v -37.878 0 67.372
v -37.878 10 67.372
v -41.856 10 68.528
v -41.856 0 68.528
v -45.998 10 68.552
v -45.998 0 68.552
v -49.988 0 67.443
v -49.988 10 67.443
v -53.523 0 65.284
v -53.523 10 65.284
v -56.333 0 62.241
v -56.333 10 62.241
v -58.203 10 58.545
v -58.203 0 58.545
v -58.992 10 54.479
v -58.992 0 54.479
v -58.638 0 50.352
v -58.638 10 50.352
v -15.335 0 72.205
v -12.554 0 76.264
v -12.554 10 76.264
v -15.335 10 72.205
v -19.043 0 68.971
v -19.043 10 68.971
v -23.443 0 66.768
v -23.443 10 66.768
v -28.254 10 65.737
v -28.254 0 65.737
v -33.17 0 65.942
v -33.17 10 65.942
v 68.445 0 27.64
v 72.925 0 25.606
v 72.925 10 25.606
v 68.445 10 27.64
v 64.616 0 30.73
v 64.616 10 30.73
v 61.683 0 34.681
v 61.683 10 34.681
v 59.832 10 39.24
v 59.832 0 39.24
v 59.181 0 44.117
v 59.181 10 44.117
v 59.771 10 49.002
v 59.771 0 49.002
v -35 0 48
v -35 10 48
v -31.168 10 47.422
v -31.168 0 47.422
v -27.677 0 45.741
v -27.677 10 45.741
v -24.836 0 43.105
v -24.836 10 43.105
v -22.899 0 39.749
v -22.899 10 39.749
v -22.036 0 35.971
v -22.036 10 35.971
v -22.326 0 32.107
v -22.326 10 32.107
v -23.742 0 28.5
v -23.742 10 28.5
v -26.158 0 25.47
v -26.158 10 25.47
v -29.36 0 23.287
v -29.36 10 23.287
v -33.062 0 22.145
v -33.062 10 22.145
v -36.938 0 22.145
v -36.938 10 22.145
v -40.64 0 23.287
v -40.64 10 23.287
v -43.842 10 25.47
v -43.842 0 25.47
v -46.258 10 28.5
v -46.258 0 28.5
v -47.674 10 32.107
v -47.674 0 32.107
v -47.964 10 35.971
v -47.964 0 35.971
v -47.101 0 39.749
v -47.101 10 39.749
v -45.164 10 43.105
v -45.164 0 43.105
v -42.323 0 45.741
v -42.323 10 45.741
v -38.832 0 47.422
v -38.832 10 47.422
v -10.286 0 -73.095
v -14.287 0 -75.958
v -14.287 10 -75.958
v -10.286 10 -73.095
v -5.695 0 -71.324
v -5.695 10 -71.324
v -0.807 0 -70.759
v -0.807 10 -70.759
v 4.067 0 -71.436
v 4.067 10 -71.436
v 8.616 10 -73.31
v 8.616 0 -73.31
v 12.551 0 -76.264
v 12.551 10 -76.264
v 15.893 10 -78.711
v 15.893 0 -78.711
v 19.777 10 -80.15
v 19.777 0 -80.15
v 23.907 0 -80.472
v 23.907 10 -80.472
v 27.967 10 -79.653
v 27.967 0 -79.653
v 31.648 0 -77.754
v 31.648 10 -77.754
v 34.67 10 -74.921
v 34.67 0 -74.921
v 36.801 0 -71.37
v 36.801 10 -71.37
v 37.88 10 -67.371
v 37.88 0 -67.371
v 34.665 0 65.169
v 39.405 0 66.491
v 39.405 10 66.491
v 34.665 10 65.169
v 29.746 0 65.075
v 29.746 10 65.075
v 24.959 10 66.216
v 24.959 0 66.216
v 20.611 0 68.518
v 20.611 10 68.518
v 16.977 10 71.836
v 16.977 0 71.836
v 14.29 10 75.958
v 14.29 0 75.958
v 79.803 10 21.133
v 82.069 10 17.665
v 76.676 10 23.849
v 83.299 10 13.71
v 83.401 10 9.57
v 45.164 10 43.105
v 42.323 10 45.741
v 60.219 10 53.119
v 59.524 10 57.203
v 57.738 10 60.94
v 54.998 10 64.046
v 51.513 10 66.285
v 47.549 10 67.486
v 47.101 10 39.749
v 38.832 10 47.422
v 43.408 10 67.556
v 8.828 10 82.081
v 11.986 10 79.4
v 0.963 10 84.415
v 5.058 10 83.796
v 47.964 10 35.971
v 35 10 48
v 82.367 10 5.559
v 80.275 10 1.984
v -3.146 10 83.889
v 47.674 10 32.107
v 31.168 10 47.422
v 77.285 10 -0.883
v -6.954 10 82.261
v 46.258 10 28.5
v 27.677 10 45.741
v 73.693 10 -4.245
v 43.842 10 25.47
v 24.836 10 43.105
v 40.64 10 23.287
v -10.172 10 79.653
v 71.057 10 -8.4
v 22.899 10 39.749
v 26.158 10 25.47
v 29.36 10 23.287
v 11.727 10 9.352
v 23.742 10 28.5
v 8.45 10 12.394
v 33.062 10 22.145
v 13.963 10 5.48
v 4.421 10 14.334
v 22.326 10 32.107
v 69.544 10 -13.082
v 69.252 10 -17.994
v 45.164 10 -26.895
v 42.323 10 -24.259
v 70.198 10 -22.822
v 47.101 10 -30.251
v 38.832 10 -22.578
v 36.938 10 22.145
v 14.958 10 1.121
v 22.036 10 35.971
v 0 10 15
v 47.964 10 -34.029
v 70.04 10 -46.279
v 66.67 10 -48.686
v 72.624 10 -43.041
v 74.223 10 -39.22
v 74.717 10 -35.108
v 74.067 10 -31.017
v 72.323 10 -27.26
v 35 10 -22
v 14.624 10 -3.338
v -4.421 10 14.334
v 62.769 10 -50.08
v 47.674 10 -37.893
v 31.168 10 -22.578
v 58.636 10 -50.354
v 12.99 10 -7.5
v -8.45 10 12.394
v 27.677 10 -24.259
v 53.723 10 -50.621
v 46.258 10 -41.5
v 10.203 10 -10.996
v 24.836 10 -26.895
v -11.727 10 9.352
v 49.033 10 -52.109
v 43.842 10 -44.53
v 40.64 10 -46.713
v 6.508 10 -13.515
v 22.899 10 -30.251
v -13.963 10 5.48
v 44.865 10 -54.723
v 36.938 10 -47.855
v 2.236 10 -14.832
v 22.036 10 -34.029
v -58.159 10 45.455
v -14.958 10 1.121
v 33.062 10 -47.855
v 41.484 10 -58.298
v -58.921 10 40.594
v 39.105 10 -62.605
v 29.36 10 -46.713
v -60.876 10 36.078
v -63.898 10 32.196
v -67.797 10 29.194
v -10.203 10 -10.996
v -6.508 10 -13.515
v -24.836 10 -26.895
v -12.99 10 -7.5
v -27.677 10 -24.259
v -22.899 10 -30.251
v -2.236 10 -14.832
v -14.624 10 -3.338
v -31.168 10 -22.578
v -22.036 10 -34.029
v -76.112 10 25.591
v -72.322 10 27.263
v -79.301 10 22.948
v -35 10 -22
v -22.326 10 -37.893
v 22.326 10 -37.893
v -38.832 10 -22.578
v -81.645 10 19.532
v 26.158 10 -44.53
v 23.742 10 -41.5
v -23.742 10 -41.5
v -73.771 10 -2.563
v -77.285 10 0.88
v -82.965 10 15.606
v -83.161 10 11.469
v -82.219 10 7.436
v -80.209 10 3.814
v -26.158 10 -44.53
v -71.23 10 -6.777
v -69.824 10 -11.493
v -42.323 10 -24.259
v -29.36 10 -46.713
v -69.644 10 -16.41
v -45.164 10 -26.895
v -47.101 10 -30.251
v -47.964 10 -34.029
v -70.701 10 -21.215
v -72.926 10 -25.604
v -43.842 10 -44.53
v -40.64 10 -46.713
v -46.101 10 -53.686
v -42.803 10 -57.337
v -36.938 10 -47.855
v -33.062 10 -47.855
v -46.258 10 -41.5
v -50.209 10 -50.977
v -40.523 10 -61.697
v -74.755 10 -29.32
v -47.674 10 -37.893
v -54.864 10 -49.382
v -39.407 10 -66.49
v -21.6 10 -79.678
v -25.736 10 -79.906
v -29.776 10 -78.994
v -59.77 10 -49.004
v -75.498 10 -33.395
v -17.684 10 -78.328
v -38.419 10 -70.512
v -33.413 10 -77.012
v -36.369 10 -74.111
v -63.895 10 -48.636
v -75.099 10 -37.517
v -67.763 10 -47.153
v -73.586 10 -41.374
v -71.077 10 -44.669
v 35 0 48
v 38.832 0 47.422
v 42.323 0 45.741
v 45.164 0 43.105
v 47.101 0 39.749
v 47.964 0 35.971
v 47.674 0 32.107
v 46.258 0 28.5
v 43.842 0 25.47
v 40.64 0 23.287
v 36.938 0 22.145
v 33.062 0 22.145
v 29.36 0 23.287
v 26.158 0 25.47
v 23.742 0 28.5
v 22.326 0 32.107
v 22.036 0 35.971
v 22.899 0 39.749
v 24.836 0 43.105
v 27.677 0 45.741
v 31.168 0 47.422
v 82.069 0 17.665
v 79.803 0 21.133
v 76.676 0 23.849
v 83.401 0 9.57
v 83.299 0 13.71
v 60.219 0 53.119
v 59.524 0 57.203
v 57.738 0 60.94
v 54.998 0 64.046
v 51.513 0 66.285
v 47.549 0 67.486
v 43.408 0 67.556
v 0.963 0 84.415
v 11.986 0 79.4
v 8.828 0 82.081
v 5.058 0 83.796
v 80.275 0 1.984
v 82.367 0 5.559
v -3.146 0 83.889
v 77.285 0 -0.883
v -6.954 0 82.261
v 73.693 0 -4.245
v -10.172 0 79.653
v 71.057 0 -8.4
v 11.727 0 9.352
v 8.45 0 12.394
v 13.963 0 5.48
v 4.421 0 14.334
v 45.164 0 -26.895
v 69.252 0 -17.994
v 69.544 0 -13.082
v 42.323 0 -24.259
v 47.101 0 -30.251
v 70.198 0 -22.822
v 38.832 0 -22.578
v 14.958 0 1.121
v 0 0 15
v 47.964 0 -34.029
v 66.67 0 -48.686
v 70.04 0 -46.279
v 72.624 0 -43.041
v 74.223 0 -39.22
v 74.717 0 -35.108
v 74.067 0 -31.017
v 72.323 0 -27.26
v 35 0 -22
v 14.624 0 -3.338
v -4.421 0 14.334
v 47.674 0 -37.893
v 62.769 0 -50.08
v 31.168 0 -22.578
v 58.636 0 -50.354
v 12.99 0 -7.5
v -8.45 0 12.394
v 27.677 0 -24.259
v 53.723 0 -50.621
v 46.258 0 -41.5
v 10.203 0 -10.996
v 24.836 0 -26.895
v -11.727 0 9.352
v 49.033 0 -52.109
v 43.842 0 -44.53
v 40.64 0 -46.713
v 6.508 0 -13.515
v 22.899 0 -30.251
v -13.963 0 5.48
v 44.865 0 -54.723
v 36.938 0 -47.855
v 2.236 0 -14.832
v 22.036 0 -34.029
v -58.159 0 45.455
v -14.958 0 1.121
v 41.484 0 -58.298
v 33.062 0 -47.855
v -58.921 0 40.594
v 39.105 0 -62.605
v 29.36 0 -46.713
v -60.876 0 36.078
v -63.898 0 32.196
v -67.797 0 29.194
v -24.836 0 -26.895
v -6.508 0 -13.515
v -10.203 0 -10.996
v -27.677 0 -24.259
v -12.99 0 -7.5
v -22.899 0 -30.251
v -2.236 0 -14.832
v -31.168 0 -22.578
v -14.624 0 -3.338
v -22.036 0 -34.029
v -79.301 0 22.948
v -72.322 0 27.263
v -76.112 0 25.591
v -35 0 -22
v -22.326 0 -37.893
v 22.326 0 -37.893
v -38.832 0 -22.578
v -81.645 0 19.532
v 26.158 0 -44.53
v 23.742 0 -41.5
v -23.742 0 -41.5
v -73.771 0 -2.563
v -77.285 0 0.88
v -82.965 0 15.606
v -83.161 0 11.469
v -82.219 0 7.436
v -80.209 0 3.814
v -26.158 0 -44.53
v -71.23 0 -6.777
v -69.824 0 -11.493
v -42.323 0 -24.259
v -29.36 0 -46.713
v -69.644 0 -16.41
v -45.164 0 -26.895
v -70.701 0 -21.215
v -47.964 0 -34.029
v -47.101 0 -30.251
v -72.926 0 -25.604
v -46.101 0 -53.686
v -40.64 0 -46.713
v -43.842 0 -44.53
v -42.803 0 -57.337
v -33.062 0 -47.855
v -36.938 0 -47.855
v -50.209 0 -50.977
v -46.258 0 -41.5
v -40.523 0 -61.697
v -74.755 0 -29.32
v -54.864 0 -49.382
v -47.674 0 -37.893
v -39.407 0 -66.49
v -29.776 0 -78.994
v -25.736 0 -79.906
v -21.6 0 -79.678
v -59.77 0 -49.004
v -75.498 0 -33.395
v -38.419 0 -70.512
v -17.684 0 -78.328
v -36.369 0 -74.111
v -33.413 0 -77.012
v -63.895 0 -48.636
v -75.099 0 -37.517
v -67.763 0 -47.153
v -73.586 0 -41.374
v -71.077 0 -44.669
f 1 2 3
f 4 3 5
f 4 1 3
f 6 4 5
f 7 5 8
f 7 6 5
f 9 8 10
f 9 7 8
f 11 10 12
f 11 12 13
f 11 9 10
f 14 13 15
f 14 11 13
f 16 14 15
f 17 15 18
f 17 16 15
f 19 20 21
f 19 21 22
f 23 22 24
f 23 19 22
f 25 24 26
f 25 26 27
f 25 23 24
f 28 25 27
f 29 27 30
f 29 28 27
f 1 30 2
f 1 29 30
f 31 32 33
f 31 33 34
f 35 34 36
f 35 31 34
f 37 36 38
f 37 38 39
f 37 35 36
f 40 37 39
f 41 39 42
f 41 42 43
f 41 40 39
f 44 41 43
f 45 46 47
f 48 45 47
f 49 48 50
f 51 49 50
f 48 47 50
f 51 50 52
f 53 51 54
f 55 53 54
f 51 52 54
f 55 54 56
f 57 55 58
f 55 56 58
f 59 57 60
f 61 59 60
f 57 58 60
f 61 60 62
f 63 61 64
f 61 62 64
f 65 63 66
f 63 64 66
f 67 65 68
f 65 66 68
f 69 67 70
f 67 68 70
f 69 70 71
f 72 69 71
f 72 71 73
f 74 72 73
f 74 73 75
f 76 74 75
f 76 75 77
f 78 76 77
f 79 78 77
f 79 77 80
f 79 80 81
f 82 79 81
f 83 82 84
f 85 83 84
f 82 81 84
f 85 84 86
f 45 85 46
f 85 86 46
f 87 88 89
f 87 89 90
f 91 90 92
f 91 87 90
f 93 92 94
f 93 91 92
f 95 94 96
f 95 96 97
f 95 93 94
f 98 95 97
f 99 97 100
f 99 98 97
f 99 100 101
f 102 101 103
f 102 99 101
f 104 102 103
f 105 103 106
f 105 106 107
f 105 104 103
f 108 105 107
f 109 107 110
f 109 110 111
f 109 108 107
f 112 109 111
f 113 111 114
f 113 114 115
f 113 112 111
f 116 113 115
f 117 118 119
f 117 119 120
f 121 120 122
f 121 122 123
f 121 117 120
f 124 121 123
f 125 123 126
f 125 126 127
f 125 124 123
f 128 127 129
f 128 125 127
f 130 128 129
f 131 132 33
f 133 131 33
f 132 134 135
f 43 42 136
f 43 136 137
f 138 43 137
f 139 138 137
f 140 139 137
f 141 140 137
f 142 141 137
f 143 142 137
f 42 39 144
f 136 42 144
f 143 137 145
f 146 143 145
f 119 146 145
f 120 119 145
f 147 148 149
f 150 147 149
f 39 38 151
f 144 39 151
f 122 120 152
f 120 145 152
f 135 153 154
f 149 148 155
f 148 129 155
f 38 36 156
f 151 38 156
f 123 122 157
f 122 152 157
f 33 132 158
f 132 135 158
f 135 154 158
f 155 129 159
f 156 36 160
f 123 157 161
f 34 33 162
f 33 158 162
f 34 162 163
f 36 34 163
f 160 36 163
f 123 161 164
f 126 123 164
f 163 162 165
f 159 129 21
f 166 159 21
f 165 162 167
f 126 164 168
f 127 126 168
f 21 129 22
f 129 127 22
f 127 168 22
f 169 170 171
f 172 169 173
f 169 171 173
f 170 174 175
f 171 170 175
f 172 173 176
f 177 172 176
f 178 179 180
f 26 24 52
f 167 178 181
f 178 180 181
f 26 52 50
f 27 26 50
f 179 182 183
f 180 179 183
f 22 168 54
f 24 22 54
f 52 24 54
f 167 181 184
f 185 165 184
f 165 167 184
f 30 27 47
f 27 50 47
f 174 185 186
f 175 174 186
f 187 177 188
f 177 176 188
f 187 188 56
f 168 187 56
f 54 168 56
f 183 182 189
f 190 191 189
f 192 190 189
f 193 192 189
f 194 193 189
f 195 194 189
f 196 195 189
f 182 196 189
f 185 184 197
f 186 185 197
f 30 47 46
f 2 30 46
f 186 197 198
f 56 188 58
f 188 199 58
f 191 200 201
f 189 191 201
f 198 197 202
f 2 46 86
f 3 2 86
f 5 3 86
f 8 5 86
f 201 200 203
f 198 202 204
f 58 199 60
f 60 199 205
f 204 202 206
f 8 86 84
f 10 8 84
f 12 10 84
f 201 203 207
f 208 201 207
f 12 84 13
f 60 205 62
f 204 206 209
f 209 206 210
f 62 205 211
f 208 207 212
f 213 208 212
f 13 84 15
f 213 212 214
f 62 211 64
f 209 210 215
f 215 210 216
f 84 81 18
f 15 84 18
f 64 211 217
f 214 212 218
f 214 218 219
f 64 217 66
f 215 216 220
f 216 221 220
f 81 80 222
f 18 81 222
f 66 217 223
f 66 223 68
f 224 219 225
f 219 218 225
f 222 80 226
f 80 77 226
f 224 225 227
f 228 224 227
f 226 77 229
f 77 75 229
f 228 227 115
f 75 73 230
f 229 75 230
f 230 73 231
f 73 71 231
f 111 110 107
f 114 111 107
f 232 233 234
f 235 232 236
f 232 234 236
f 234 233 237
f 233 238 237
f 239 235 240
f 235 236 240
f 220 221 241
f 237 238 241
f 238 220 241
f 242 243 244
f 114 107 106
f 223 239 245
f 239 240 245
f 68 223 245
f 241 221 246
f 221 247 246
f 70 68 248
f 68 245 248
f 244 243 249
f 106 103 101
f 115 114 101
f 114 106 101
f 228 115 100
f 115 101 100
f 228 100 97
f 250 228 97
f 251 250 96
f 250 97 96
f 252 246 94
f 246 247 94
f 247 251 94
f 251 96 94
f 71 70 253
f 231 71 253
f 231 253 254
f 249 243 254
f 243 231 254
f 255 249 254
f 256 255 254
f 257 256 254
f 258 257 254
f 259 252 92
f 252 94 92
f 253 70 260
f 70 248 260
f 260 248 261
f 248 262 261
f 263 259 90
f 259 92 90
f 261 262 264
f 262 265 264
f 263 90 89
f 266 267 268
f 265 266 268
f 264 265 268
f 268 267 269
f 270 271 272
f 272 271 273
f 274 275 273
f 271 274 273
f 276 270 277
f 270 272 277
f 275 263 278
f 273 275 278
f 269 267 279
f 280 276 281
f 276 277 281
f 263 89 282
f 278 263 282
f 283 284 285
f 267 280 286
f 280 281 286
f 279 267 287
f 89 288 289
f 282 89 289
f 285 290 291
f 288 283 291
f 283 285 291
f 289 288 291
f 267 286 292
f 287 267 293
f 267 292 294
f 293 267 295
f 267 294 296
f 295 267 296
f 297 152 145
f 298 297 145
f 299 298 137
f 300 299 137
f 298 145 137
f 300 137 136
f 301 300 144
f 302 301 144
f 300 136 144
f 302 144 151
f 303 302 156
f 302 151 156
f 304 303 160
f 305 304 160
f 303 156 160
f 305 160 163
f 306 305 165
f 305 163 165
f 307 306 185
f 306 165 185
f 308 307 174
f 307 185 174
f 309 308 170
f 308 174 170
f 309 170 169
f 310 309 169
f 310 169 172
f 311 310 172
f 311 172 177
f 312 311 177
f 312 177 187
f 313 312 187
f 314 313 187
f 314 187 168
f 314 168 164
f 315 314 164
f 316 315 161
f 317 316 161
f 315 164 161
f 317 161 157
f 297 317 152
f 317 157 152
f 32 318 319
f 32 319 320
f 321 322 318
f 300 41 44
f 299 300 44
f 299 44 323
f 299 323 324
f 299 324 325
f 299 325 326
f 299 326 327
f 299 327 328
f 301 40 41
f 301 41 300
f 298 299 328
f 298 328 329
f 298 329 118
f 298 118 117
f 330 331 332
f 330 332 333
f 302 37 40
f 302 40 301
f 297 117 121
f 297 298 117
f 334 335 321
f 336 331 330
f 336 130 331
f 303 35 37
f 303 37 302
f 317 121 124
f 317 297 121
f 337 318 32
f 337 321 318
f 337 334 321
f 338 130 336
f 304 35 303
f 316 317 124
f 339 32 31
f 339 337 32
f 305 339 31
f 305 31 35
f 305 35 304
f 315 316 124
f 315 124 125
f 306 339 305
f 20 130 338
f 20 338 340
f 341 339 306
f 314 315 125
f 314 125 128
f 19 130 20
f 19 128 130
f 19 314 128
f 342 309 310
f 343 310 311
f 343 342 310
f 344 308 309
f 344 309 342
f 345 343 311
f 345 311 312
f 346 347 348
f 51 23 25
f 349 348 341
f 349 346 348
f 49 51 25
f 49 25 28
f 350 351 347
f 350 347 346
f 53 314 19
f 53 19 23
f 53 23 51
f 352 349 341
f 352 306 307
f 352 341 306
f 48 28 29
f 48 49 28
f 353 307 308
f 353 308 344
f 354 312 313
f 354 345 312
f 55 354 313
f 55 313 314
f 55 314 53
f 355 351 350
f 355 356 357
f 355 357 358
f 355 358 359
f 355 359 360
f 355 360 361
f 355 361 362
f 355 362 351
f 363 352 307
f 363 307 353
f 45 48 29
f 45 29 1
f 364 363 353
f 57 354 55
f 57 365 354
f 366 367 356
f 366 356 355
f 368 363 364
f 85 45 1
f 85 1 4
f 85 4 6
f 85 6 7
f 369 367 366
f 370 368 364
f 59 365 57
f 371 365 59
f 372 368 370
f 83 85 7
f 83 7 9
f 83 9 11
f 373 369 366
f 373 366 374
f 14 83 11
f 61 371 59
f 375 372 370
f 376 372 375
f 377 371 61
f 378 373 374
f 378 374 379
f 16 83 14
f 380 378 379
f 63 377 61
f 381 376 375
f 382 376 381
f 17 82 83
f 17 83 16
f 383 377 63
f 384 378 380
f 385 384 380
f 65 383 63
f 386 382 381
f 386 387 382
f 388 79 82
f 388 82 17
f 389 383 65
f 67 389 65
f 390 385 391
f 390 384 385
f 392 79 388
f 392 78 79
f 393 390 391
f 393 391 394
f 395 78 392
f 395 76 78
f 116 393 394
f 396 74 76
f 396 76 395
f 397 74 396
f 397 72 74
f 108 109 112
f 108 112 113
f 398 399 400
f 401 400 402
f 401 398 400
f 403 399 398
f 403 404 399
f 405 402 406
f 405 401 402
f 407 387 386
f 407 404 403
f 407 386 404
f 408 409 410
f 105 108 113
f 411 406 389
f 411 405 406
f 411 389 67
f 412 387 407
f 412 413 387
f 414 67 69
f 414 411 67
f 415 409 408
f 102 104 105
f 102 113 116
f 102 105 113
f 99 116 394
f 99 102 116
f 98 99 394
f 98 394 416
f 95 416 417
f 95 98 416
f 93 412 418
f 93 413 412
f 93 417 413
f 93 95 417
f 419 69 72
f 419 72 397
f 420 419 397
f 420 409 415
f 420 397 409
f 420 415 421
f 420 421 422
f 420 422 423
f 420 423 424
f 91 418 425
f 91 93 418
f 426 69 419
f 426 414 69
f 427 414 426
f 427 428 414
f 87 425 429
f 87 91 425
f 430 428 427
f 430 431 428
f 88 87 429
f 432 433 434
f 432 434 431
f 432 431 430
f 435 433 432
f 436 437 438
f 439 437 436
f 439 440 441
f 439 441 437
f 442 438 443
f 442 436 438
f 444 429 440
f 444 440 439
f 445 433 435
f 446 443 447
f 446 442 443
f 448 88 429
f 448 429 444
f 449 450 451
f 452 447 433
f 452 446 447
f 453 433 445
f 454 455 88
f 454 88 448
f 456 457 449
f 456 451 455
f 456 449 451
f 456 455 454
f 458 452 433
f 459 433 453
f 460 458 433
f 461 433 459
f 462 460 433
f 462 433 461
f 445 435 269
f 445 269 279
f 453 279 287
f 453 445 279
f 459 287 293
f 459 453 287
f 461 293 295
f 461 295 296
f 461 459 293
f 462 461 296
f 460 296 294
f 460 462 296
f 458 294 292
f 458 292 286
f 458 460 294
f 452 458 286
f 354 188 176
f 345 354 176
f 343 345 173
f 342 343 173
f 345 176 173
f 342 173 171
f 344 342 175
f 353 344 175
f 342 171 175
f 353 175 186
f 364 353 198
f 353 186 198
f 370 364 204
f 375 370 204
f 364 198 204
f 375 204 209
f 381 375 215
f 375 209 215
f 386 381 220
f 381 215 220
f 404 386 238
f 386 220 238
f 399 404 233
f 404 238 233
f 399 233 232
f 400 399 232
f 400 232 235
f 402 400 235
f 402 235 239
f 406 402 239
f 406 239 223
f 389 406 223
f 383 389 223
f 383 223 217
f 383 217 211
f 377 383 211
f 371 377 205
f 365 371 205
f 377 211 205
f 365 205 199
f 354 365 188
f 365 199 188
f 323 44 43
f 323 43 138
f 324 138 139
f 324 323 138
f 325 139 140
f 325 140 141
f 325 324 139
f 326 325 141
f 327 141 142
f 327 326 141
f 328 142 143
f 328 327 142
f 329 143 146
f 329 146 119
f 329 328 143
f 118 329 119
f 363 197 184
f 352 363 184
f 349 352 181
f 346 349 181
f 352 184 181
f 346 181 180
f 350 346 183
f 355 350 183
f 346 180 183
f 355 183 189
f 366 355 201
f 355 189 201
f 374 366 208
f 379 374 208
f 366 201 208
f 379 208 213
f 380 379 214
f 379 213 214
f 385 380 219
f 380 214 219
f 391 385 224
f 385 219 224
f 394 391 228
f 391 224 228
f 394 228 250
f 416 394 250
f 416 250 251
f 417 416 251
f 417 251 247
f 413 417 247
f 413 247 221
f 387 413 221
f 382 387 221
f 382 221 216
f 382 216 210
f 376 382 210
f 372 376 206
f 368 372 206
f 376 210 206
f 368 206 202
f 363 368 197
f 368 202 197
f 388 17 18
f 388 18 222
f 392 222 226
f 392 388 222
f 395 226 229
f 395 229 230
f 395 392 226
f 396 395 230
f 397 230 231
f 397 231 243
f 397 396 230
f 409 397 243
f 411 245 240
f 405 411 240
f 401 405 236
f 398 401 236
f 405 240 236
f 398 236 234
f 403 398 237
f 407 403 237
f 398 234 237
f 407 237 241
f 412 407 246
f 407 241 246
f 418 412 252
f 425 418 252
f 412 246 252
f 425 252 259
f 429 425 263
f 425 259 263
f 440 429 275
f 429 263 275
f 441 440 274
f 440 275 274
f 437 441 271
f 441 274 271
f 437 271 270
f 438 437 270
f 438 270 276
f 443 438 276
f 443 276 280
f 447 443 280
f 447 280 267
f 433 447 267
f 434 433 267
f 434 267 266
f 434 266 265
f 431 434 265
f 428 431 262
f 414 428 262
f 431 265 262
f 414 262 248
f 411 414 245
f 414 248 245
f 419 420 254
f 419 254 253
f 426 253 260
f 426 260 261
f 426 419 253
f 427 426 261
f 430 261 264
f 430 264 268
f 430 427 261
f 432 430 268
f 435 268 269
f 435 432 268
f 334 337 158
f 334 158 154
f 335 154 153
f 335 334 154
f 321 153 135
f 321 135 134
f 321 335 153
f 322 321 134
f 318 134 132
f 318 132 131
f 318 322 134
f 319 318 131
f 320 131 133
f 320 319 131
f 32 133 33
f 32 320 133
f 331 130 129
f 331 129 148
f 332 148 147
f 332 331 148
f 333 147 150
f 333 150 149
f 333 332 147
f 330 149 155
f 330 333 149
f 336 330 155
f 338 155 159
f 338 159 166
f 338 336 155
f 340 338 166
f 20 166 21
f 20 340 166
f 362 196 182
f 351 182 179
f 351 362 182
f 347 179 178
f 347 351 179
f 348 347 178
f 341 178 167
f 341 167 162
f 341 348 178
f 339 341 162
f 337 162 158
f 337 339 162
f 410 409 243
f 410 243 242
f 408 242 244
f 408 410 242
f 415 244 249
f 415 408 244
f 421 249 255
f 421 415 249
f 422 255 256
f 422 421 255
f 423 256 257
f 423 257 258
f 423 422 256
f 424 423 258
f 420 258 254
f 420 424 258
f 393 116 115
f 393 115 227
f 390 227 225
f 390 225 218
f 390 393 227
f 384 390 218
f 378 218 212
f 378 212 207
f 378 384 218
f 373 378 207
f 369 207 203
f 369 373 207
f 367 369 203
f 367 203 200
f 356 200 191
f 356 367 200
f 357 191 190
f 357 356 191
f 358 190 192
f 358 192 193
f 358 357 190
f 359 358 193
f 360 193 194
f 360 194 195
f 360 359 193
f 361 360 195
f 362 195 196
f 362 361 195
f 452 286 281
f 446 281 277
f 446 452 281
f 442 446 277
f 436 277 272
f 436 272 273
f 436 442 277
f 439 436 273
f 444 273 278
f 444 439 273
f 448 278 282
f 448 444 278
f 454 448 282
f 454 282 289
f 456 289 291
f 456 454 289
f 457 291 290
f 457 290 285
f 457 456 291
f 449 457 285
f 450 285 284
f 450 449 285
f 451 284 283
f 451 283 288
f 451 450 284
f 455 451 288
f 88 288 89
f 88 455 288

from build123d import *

# Parameters (mm, degrees)
BOSS_EXTRUDE1_DEPTH = 10
SKETCH2_R           = 13
CUT_EXTRUDE1_DEPTH  = 10
SKETCH3_R           = 15
CUT_EXTRUDE2_DEPTH  = 10


with BuildPart() as part:
    # Sketch1 → Boss-Extrude1 (new body)
    with BuildSketch(Plane(origin=(0, 0, 0), x_dir=(1, 0, 0), z_dir=(0, 1, 0))):
        with BuildLine():
            ThreePointArc((-14.287102681, 75.958258112), (-0.806955409, 70.759221722), (12.551119215, 76.264327736))
            ThreePointArc((12.551119215, 76.264327736), (27.96684553, 79.652976213), (37.880471551, 67.370974118))
            ThreePointArc((37.880471551, 67.370974118), (44.864987287, 54.723409538), (58.636480059, 50.354160551))
            ThreePointArc((58.636480059, 50.354160551), (72.623792794, 43.040978017), (72.32335215, 27.260062589))
            ThreePointArc((72.32335215, 27.260062589), (69.544103812, 13.081905848), (77.285180212, 0.882722021))
            ThreePointArc((77.285180212, 0.882722021), (83.299260286, -13.71037214), (72.925332493, -25.606135188))
            ThreePointArc((72.925332493, -25.606135188), (61.682761267, -34.680766977), (59.771285614, -49.001751954))
            ThreePointArc((59.771285614, -49.001751954), (54.998078122, -64.046486799), (39.404739288, -66.490937729))
            ThreePointArc((39.404739288, -66.490937729), (24.959369198, -66.2159235), (14.289742194, -75.957761595))
            ThreePointArc((14.289742194, -75.957761595), (0.962683969, -84.414538487), (-12.553769364, -76.263891543))
            ThreePointArc((-12.553769364, -76.263891543), (-23.442789112, -66.767913509), (-37.878130411, -67.37229041))
            ThreePointArc((-37.878130411, -67.37229041), (-53.523160712, -65.284089454), (-58.638229812, -50.352122925))
            ThreePointArc((-58.638229812, -50.352122925), (-60.875805858, -36.078454745), (-72.322404829, -27.262575782))
            ThreePointArc((-72.322404829, -27.262575782), (-82.964923652, -15.606489414), (-77.285210839, -0.880036389))
            ThreePointArc((-77.285210839, -0.880036389), (-69.824356485, 11.492513962), (-72.926222253, 25.603601044))
            ThreePointArc((-72.926222253, 25.603601044), (-73.586476763, 41.37356047), (-59.769582785, 49.003828954))
            ThreePointArc((-59.769582785, 49.003828954), (-46.101314701, 53.686007661), (-39.4070498, 66.489568389))
            ThreePointArc((-39.4070498, 66.489568389), (-29.776099574, 78.994461594), (-14.287102681, 75.958258112))
        make_face()
    extrude(amount=BOSS_EXTRUDE1_DEPTH)

    # Sketch2 → Cut-Extrude1 (cut)
    with BuildSketch(Plane(origin=(0, 10, 0), x_dir=(-1, 0, 0), z_dir=(0, 1, 0))):
        with Locations(Location((-35, 35, 0), (0, 0, 90))):
            Circle(SKETCH2_R)
        with Locations(Location((35, 35, 0), (0, 0, 90))):
            Circle(SKETCH2_R)
        with Locations(Location((35, -35, 0), (0, 0, 90))):
            Circle(SKETCH2_R)
        with Locations(Location((-35, -35, 0), (0, 0, 90))):
            Circle(SKETCH2_R)
    extrude(amount=-CUT_EXTRUDE1_DEPTH, mode=Mode.SUBTRACT)

    # Sketch3 → Cut-Extrude2 (cut)
    with BuildSketch(Plane(origin=(0, 10, 0), x_dir=(1, 0, 0), z_dir=(0, 1, 0))):
        with Locations(Location((0, 0, 0), (0, 0, 270))):
            Circle(SKETCH3_R)
    extrude(amount=-CUT_EXTRUDE2_DEPTH, mode=Mode.SUBTRACT)


solid = part.part
